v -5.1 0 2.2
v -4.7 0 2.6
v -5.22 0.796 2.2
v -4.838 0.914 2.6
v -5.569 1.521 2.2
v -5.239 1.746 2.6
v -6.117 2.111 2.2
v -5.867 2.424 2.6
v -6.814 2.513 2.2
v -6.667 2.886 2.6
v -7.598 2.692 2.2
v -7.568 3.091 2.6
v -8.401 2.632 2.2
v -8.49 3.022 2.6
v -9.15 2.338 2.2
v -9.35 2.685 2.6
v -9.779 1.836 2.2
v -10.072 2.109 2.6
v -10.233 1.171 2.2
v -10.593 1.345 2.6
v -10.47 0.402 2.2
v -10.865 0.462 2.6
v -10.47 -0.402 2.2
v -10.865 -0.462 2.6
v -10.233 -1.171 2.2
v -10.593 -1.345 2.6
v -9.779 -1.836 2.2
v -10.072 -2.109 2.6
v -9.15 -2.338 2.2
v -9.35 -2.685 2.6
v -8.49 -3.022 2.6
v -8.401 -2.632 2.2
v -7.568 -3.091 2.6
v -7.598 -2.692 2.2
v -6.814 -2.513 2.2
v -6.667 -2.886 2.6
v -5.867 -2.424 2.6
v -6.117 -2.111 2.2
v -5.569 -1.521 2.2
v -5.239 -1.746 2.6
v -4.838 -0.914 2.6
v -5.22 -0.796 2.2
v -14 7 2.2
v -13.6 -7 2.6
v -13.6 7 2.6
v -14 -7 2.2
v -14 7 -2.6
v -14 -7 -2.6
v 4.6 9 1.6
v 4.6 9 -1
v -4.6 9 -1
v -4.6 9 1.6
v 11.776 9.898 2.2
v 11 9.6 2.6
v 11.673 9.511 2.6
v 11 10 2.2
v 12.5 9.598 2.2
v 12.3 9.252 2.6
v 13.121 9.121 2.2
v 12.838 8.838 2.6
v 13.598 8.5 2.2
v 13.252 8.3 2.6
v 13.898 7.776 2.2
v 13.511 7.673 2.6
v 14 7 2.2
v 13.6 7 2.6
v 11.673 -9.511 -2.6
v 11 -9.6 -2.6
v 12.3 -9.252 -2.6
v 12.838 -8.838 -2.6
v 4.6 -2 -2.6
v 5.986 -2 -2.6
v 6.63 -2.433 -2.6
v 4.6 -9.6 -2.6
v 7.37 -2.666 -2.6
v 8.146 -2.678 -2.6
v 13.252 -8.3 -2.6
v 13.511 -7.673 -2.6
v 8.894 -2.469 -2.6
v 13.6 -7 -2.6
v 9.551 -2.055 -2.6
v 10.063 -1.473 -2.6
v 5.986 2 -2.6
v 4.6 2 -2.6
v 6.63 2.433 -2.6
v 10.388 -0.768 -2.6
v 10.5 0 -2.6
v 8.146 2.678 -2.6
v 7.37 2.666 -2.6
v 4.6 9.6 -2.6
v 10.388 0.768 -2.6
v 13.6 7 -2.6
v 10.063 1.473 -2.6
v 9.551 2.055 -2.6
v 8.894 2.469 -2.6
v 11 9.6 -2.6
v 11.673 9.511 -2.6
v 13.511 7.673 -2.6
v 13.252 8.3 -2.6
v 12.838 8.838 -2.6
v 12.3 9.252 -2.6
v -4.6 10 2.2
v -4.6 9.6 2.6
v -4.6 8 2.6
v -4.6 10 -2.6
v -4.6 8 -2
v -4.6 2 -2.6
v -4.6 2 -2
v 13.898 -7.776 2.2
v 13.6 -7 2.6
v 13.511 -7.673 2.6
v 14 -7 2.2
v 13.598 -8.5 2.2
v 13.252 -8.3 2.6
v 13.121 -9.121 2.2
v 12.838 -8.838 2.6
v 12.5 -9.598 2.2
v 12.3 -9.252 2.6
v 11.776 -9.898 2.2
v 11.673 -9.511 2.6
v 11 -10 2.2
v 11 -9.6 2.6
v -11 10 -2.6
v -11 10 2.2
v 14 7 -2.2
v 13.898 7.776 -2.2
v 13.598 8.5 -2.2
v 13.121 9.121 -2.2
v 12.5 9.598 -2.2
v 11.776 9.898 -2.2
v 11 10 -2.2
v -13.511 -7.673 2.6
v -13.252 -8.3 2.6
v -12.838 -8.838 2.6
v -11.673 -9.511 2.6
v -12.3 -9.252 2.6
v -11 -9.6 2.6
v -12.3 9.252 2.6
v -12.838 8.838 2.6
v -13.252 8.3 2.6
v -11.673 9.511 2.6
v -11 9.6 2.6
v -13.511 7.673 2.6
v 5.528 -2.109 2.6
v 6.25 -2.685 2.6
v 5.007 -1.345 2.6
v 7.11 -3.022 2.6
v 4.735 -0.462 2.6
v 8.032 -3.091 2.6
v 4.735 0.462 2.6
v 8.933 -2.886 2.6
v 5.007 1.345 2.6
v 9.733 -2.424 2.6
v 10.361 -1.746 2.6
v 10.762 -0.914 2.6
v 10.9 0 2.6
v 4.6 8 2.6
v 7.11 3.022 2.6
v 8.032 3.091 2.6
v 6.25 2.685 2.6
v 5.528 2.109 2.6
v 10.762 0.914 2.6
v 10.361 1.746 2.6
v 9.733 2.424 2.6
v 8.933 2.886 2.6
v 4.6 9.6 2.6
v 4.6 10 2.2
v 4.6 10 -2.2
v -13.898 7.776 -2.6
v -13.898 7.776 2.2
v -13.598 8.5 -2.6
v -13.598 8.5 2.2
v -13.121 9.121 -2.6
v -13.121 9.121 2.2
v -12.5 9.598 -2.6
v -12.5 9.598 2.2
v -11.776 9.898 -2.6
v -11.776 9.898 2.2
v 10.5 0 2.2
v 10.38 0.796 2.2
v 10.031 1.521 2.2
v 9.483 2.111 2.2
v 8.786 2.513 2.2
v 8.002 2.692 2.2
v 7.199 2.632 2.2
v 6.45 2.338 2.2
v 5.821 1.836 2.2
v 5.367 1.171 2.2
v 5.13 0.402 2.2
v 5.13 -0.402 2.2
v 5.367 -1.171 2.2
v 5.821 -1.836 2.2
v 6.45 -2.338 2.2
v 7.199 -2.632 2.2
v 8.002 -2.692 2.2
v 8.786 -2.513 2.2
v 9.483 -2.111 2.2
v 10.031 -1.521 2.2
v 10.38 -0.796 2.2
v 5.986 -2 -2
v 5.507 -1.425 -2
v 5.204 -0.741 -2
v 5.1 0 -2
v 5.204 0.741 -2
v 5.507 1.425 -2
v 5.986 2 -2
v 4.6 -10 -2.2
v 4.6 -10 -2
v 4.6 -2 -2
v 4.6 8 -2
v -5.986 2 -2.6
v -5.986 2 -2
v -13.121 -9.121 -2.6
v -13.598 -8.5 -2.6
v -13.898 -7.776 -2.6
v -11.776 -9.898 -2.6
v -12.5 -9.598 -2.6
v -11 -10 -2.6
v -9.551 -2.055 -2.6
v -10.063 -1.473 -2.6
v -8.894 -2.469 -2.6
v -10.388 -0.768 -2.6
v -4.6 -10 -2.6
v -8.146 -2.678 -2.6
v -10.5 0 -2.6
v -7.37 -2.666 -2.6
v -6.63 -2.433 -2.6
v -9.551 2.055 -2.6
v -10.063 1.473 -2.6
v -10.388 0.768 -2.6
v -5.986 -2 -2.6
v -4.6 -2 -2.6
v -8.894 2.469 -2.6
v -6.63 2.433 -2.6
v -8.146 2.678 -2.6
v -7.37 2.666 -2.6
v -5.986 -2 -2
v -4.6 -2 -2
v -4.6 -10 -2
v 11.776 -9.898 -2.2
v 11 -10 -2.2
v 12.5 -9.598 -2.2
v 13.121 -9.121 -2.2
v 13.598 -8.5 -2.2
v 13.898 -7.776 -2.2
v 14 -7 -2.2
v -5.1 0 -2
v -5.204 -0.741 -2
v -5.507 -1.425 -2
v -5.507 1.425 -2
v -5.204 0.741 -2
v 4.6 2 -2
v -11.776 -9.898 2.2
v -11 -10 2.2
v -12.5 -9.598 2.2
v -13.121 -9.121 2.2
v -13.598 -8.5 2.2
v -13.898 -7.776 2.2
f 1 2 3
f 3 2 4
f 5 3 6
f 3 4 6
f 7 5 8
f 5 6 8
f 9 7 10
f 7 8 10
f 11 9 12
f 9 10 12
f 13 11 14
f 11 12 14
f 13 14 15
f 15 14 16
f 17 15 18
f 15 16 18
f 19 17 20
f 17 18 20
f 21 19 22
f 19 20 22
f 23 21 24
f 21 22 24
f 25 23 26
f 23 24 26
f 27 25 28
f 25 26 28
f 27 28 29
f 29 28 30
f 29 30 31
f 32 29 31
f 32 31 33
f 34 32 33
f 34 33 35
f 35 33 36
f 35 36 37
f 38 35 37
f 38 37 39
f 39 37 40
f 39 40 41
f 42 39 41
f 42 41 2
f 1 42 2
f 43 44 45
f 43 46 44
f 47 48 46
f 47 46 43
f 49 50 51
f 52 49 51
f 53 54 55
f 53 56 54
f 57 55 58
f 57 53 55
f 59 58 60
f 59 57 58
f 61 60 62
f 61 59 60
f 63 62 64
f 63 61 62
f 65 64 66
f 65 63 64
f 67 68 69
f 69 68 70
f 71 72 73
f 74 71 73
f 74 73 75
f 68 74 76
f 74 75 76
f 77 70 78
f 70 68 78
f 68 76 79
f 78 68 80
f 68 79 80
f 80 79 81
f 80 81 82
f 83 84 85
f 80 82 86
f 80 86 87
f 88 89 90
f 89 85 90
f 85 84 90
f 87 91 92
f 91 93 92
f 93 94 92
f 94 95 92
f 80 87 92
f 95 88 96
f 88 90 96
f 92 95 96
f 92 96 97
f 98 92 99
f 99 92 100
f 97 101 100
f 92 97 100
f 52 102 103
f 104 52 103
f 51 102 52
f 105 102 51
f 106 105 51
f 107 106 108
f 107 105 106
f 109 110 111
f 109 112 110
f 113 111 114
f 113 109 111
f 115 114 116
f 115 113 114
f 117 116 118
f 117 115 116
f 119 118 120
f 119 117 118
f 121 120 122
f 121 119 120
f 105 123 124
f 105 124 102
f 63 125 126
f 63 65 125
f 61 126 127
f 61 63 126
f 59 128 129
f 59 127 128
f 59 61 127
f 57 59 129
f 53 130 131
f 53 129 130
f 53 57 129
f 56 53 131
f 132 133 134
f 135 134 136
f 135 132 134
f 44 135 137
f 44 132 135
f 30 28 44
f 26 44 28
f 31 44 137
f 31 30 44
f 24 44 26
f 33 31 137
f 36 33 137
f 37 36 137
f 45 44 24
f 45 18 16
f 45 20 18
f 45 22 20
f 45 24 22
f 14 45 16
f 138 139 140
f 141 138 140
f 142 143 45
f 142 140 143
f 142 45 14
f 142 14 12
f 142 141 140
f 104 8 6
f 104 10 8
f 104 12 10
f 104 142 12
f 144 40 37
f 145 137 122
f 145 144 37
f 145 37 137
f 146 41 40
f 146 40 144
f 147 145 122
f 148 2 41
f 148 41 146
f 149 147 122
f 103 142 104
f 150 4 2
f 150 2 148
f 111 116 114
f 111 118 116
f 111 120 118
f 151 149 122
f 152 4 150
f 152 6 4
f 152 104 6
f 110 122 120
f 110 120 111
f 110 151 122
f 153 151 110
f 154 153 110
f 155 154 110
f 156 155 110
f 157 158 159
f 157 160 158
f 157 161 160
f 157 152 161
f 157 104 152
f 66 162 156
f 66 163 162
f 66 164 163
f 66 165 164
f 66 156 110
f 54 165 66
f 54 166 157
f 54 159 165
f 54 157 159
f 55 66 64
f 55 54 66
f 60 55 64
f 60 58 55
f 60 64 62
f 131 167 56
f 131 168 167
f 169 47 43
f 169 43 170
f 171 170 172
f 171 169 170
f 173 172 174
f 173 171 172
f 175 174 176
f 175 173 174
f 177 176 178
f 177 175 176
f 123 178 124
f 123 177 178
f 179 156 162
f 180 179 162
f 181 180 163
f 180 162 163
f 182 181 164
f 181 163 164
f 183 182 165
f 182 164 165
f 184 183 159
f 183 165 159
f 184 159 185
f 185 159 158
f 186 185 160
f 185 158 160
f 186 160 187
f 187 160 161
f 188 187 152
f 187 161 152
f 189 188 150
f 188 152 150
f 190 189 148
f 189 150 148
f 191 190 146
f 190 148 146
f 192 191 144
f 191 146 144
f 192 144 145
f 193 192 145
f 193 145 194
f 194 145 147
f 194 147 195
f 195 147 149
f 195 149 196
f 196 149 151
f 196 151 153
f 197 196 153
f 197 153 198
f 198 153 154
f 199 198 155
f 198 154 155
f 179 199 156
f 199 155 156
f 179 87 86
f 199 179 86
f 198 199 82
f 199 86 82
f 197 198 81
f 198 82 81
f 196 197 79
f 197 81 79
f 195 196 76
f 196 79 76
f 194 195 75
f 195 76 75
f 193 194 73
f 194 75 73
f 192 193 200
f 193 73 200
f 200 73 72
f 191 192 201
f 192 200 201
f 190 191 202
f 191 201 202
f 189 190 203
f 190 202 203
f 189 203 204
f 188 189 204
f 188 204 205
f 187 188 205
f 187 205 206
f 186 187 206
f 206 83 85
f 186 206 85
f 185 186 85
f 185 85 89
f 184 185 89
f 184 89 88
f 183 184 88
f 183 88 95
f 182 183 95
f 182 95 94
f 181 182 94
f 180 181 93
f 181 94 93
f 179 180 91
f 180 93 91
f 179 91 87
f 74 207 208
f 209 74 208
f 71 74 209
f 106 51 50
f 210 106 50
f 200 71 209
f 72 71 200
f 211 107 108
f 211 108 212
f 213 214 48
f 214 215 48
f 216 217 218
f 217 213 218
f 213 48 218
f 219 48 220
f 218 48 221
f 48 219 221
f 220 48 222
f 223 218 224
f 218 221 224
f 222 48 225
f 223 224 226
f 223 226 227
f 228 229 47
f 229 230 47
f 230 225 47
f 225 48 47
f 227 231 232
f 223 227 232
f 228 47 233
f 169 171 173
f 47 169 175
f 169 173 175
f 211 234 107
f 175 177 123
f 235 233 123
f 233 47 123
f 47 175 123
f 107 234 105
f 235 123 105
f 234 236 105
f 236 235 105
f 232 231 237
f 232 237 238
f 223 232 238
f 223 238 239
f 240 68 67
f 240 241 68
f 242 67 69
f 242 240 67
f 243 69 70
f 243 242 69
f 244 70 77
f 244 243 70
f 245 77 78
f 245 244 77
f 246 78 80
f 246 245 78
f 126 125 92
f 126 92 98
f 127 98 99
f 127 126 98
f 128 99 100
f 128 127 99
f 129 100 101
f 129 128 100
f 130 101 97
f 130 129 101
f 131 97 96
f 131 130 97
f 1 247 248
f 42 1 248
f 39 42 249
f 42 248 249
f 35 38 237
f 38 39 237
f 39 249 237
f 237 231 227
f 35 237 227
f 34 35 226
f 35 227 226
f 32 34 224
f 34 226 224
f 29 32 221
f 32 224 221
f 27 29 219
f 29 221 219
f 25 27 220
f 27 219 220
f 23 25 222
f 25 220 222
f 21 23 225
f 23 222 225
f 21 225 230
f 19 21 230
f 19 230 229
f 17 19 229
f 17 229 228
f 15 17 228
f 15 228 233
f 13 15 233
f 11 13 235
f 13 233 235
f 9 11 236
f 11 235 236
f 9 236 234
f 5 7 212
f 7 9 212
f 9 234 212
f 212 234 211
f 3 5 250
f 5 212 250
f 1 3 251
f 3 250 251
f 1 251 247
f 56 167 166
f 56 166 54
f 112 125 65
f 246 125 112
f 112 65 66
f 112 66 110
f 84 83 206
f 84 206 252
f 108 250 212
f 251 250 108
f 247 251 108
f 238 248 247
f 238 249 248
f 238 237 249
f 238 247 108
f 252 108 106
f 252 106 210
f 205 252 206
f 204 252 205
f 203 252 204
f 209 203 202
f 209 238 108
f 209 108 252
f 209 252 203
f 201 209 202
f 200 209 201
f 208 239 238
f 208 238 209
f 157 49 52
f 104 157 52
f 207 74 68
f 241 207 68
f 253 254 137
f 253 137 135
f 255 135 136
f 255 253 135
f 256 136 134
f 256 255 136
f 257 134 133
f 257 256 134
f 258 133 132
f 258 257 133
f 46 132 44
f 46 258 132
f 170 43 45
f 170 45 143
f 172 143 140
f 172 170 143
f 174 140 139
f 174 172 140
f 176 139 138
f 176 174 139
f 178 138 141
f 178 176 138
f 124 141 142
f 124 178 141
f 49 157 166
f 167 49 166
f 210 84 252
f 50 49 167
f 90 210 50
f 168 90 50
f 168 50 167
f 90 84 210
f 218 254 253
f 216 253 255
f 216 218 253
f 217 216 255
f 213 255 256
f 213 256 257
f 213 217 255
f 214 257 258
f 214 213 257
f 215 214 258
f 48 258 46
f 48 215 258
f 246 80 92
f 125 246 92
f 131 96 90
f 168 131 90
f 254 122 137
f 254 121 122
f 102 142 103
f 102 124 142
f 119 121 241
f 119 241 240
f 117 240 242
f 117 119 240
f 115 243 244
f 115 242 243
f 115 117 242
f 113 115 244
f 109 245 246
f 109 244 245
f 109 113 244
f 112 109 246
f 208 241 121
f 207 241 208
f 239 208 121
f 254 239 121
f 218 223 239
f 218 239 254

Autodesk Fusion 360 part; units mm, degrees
sketch "Sketch1" plane through (0, 0, 0) normal (0, 0, 1) x (1, 0, 0) in component "[a]_z_belt_clip_upper_x4"
  line L0 (14, -10) -> (-14, -10)
  line L1 (-14, -10) -> (-14, 10)
  line L2 (-14, 10) -> (14, 10)
  line L3 (14, 10) -> (14, -10)
  line L4 (14, -10) -> (-14, 10) construction
  line L5 (-14, -10) -> (14, 10) construction
  circle A0 centre (-7.8, 0) radius 2.7
  circle A1 centre (7.8, 0) radius 2.7
  dimension "d4" = 28
  dimension "d5" = 20
  dimension "d6" = 5.4
  dimension "d7" = 5.4
  dimension "d8" = 6.2
  dimension "d9" = 6.2
extrude "Extrude1" add sketch "Sketch1" along normal mid plane 5.2 in component "[a]_z_belt_clip_upper_x4"
fillet "Fillet1" radius 3 4 edges at (14, -10, 0) (14, 10, 0) (-14, -10, 0) (-14, 10, 0) in component "[a]_z_belt_clip_upper_x4"
sketch "Sketch2" plane through (0, 0, 2.6) normal (0, 0, 1) x (-1, 0, 0) in component "[a]_z_belt_clip_upper_x4"
  arc A0 (11, -10) -> (14, -7) centre (11, -7) ccw
  line L0 (14, -7) -> (14, 7)
  arc A1 (14, 7) -> (11, 10) centre (11, 7) ccw
  line L1 (11, 10) -> (-11, 10)
  arc A2 (-11, 10) -> (-14, 7) centre (-11, 7) ccw
  line L2 (-14, 7) -> (-14, -7)
  arc A3 (-14, -7) -> (-11, -10) centre (-11, -7) ccw
  line L3 (-11, -10) -> (11, -10)
  circle A4 centre (-7.8, 0) radius 2.7
  circle A5 centre (7.8, 0) radius 2.7
  line L4 (-4.6, -9) -> (4.6, -9)
  line L5 (4.6, -9) -> (4.6, -10)
  line L6 (4.6, -10) -> (-4.6, -10)
  line L7 (-4.6, -10) -> (-4.6, -9)
  line L8 (-4.6, -9) -> (4.6, -10) construction
  line L9 (4.6, -9) -> (-4.6, -10) construction
  line L10 (0, 0) -> (0, -20) construction
  point P0 (0, -9.5)
  dimension "d14" = 9.2
  dimension "d15" = 1
extrude "Extrude2" cut sketch "Sketch2" along normal through all and the other way through all contours L3 L4 L5 L6 L7 in component "[a]_z_belt_clip_upper_x4"
sketch "Sketch3" plane through (0, 0, -2.6) normal (0, 0, -1) x (1, 0, 0) in component "[a]_z_belt_clip_upper_x4"
  line L0 (4.6, -9) -> (4.6, -10)
  line L1 (4.6, -10) -> (11, -10)
  arc A0 (11, -10) -> (14, -7) centre (11, -7) ccw
  line L2 (14, -7) -> (14, 7)
  arc A1 (14, 7) -> (11, 10) centre (11, 7) ccw
  line L3 (11, 10) -> (-11, 10)
  arc A2 (-11, 10) -> (-14, 7) centre (-11, 7) ccw
  line L4 (-14, 7) -> (-14, -7)
  arc A3 (-14, -7) -> (-11, -10) centre (-11, -7) ccw
  line L5 (-11, -10) -> (-4.6, -10)
  line L6 (-4.6, -10) -> (-4.6, -9)
  line L7 (-4.6, -9) -> (4.6, -9)
  circle A4 centre (7.8, 0) radius 2.7
  circle A5 centre (-7.8, 0) radius 2.7
  line L8 (7.6, -2) -> (-7.6, -2)
  line L9 (-7.6, -2) -> (-7.6, 2)
  line L10 (-7.6, 2) -> (7.6, 2)
  line L11 (7.6, 2) -> (7.6, -2)
  line L12 (7.6, -2) -> (-7.6, 2) construction
  line L13 (-7.6, -2) -> (7.6, 2) construction
  line L14 (4.6, -10) -> (-4.6, -10)
  line L15 (-4.6, -10) -> (-4.6, 10)
  line L16 (-4.6, 10) -> (4.6, 10)
  line L17 (4.6, 10) -> (4.6, -10)
  line L18 (4.6, -10) -> (-4.6, 10) construction
  line L19 (-4.6, -10) -> (4.6, 10) construction
  dimension "d17" = 4
  dimension "d18" = 15.2
extrude "Extrude3" cut sketch "Sketch3" against normal blind 0.6 contours L0 L6 L7 L14 L15 L17 | L7 L8 L15 L17 | A4 L8 L10 L17 | L8 L10 L15 L17 | A5 L8 L10 L15 | A4 L8 L10 L11 | L3 L10 L15 L16 L17 | A5 L8 L9 L10 picked at (8.5667, 0) picked at (-6.7667, 0) in component "[a]_z_belt_clip_upper_x4"
chamfer "Chamfer1" distance 0.4 angle 45 16 edges at (-10.3173, 0.9764, 2.6) (5.2827, 0.9764, 2.6) (14, 0, 2.6) (13.1213, -9.1213, 2.6) (0, -10, 2.6) (-13.1213, -9.1213, 2.6) (-14, 0, 2.6) (-13.1213, 9.1213, 2.6) (-7.8, 10, 2.6) (7.8, 10, 2.6) (13.1213, 9.1213, 2.6) (7.8, -10, -2.6) (7.8, 10, -2.6) (13.1213, 9.1213, -2.6) (14, 0, -2.6) (13.1213, -9.1213, -2.6) in component "[a]_z_belt_clip_upper_x4"
chamfer "Chamfer2" distance 1 angle 45 2 edges at (0, 9, 2.6) (0, 9, -2) in component "[a]_z_belt_clip_upper_x4"
component "[a]_z_belt_clip_upper_x4" placed x (1, 0, 0) y (0, 1, 0) z (0, 0, 1) at (0, 0, 0)
equation "tolerance = 0.2 mm"
equation "chamfer = 0.4 mm"
equation "z_belt_width = 9 mm"
equation "d4 = z_belt_width + 19 mm"
equation "d10 = ( 5.2 / 2 ) * 1 mm"
equation "d14 = z_belt_width + tolerance"
equation "d18 = z_belt_width + tolerance + 6 mm"
equation "d21 = chamfer"
